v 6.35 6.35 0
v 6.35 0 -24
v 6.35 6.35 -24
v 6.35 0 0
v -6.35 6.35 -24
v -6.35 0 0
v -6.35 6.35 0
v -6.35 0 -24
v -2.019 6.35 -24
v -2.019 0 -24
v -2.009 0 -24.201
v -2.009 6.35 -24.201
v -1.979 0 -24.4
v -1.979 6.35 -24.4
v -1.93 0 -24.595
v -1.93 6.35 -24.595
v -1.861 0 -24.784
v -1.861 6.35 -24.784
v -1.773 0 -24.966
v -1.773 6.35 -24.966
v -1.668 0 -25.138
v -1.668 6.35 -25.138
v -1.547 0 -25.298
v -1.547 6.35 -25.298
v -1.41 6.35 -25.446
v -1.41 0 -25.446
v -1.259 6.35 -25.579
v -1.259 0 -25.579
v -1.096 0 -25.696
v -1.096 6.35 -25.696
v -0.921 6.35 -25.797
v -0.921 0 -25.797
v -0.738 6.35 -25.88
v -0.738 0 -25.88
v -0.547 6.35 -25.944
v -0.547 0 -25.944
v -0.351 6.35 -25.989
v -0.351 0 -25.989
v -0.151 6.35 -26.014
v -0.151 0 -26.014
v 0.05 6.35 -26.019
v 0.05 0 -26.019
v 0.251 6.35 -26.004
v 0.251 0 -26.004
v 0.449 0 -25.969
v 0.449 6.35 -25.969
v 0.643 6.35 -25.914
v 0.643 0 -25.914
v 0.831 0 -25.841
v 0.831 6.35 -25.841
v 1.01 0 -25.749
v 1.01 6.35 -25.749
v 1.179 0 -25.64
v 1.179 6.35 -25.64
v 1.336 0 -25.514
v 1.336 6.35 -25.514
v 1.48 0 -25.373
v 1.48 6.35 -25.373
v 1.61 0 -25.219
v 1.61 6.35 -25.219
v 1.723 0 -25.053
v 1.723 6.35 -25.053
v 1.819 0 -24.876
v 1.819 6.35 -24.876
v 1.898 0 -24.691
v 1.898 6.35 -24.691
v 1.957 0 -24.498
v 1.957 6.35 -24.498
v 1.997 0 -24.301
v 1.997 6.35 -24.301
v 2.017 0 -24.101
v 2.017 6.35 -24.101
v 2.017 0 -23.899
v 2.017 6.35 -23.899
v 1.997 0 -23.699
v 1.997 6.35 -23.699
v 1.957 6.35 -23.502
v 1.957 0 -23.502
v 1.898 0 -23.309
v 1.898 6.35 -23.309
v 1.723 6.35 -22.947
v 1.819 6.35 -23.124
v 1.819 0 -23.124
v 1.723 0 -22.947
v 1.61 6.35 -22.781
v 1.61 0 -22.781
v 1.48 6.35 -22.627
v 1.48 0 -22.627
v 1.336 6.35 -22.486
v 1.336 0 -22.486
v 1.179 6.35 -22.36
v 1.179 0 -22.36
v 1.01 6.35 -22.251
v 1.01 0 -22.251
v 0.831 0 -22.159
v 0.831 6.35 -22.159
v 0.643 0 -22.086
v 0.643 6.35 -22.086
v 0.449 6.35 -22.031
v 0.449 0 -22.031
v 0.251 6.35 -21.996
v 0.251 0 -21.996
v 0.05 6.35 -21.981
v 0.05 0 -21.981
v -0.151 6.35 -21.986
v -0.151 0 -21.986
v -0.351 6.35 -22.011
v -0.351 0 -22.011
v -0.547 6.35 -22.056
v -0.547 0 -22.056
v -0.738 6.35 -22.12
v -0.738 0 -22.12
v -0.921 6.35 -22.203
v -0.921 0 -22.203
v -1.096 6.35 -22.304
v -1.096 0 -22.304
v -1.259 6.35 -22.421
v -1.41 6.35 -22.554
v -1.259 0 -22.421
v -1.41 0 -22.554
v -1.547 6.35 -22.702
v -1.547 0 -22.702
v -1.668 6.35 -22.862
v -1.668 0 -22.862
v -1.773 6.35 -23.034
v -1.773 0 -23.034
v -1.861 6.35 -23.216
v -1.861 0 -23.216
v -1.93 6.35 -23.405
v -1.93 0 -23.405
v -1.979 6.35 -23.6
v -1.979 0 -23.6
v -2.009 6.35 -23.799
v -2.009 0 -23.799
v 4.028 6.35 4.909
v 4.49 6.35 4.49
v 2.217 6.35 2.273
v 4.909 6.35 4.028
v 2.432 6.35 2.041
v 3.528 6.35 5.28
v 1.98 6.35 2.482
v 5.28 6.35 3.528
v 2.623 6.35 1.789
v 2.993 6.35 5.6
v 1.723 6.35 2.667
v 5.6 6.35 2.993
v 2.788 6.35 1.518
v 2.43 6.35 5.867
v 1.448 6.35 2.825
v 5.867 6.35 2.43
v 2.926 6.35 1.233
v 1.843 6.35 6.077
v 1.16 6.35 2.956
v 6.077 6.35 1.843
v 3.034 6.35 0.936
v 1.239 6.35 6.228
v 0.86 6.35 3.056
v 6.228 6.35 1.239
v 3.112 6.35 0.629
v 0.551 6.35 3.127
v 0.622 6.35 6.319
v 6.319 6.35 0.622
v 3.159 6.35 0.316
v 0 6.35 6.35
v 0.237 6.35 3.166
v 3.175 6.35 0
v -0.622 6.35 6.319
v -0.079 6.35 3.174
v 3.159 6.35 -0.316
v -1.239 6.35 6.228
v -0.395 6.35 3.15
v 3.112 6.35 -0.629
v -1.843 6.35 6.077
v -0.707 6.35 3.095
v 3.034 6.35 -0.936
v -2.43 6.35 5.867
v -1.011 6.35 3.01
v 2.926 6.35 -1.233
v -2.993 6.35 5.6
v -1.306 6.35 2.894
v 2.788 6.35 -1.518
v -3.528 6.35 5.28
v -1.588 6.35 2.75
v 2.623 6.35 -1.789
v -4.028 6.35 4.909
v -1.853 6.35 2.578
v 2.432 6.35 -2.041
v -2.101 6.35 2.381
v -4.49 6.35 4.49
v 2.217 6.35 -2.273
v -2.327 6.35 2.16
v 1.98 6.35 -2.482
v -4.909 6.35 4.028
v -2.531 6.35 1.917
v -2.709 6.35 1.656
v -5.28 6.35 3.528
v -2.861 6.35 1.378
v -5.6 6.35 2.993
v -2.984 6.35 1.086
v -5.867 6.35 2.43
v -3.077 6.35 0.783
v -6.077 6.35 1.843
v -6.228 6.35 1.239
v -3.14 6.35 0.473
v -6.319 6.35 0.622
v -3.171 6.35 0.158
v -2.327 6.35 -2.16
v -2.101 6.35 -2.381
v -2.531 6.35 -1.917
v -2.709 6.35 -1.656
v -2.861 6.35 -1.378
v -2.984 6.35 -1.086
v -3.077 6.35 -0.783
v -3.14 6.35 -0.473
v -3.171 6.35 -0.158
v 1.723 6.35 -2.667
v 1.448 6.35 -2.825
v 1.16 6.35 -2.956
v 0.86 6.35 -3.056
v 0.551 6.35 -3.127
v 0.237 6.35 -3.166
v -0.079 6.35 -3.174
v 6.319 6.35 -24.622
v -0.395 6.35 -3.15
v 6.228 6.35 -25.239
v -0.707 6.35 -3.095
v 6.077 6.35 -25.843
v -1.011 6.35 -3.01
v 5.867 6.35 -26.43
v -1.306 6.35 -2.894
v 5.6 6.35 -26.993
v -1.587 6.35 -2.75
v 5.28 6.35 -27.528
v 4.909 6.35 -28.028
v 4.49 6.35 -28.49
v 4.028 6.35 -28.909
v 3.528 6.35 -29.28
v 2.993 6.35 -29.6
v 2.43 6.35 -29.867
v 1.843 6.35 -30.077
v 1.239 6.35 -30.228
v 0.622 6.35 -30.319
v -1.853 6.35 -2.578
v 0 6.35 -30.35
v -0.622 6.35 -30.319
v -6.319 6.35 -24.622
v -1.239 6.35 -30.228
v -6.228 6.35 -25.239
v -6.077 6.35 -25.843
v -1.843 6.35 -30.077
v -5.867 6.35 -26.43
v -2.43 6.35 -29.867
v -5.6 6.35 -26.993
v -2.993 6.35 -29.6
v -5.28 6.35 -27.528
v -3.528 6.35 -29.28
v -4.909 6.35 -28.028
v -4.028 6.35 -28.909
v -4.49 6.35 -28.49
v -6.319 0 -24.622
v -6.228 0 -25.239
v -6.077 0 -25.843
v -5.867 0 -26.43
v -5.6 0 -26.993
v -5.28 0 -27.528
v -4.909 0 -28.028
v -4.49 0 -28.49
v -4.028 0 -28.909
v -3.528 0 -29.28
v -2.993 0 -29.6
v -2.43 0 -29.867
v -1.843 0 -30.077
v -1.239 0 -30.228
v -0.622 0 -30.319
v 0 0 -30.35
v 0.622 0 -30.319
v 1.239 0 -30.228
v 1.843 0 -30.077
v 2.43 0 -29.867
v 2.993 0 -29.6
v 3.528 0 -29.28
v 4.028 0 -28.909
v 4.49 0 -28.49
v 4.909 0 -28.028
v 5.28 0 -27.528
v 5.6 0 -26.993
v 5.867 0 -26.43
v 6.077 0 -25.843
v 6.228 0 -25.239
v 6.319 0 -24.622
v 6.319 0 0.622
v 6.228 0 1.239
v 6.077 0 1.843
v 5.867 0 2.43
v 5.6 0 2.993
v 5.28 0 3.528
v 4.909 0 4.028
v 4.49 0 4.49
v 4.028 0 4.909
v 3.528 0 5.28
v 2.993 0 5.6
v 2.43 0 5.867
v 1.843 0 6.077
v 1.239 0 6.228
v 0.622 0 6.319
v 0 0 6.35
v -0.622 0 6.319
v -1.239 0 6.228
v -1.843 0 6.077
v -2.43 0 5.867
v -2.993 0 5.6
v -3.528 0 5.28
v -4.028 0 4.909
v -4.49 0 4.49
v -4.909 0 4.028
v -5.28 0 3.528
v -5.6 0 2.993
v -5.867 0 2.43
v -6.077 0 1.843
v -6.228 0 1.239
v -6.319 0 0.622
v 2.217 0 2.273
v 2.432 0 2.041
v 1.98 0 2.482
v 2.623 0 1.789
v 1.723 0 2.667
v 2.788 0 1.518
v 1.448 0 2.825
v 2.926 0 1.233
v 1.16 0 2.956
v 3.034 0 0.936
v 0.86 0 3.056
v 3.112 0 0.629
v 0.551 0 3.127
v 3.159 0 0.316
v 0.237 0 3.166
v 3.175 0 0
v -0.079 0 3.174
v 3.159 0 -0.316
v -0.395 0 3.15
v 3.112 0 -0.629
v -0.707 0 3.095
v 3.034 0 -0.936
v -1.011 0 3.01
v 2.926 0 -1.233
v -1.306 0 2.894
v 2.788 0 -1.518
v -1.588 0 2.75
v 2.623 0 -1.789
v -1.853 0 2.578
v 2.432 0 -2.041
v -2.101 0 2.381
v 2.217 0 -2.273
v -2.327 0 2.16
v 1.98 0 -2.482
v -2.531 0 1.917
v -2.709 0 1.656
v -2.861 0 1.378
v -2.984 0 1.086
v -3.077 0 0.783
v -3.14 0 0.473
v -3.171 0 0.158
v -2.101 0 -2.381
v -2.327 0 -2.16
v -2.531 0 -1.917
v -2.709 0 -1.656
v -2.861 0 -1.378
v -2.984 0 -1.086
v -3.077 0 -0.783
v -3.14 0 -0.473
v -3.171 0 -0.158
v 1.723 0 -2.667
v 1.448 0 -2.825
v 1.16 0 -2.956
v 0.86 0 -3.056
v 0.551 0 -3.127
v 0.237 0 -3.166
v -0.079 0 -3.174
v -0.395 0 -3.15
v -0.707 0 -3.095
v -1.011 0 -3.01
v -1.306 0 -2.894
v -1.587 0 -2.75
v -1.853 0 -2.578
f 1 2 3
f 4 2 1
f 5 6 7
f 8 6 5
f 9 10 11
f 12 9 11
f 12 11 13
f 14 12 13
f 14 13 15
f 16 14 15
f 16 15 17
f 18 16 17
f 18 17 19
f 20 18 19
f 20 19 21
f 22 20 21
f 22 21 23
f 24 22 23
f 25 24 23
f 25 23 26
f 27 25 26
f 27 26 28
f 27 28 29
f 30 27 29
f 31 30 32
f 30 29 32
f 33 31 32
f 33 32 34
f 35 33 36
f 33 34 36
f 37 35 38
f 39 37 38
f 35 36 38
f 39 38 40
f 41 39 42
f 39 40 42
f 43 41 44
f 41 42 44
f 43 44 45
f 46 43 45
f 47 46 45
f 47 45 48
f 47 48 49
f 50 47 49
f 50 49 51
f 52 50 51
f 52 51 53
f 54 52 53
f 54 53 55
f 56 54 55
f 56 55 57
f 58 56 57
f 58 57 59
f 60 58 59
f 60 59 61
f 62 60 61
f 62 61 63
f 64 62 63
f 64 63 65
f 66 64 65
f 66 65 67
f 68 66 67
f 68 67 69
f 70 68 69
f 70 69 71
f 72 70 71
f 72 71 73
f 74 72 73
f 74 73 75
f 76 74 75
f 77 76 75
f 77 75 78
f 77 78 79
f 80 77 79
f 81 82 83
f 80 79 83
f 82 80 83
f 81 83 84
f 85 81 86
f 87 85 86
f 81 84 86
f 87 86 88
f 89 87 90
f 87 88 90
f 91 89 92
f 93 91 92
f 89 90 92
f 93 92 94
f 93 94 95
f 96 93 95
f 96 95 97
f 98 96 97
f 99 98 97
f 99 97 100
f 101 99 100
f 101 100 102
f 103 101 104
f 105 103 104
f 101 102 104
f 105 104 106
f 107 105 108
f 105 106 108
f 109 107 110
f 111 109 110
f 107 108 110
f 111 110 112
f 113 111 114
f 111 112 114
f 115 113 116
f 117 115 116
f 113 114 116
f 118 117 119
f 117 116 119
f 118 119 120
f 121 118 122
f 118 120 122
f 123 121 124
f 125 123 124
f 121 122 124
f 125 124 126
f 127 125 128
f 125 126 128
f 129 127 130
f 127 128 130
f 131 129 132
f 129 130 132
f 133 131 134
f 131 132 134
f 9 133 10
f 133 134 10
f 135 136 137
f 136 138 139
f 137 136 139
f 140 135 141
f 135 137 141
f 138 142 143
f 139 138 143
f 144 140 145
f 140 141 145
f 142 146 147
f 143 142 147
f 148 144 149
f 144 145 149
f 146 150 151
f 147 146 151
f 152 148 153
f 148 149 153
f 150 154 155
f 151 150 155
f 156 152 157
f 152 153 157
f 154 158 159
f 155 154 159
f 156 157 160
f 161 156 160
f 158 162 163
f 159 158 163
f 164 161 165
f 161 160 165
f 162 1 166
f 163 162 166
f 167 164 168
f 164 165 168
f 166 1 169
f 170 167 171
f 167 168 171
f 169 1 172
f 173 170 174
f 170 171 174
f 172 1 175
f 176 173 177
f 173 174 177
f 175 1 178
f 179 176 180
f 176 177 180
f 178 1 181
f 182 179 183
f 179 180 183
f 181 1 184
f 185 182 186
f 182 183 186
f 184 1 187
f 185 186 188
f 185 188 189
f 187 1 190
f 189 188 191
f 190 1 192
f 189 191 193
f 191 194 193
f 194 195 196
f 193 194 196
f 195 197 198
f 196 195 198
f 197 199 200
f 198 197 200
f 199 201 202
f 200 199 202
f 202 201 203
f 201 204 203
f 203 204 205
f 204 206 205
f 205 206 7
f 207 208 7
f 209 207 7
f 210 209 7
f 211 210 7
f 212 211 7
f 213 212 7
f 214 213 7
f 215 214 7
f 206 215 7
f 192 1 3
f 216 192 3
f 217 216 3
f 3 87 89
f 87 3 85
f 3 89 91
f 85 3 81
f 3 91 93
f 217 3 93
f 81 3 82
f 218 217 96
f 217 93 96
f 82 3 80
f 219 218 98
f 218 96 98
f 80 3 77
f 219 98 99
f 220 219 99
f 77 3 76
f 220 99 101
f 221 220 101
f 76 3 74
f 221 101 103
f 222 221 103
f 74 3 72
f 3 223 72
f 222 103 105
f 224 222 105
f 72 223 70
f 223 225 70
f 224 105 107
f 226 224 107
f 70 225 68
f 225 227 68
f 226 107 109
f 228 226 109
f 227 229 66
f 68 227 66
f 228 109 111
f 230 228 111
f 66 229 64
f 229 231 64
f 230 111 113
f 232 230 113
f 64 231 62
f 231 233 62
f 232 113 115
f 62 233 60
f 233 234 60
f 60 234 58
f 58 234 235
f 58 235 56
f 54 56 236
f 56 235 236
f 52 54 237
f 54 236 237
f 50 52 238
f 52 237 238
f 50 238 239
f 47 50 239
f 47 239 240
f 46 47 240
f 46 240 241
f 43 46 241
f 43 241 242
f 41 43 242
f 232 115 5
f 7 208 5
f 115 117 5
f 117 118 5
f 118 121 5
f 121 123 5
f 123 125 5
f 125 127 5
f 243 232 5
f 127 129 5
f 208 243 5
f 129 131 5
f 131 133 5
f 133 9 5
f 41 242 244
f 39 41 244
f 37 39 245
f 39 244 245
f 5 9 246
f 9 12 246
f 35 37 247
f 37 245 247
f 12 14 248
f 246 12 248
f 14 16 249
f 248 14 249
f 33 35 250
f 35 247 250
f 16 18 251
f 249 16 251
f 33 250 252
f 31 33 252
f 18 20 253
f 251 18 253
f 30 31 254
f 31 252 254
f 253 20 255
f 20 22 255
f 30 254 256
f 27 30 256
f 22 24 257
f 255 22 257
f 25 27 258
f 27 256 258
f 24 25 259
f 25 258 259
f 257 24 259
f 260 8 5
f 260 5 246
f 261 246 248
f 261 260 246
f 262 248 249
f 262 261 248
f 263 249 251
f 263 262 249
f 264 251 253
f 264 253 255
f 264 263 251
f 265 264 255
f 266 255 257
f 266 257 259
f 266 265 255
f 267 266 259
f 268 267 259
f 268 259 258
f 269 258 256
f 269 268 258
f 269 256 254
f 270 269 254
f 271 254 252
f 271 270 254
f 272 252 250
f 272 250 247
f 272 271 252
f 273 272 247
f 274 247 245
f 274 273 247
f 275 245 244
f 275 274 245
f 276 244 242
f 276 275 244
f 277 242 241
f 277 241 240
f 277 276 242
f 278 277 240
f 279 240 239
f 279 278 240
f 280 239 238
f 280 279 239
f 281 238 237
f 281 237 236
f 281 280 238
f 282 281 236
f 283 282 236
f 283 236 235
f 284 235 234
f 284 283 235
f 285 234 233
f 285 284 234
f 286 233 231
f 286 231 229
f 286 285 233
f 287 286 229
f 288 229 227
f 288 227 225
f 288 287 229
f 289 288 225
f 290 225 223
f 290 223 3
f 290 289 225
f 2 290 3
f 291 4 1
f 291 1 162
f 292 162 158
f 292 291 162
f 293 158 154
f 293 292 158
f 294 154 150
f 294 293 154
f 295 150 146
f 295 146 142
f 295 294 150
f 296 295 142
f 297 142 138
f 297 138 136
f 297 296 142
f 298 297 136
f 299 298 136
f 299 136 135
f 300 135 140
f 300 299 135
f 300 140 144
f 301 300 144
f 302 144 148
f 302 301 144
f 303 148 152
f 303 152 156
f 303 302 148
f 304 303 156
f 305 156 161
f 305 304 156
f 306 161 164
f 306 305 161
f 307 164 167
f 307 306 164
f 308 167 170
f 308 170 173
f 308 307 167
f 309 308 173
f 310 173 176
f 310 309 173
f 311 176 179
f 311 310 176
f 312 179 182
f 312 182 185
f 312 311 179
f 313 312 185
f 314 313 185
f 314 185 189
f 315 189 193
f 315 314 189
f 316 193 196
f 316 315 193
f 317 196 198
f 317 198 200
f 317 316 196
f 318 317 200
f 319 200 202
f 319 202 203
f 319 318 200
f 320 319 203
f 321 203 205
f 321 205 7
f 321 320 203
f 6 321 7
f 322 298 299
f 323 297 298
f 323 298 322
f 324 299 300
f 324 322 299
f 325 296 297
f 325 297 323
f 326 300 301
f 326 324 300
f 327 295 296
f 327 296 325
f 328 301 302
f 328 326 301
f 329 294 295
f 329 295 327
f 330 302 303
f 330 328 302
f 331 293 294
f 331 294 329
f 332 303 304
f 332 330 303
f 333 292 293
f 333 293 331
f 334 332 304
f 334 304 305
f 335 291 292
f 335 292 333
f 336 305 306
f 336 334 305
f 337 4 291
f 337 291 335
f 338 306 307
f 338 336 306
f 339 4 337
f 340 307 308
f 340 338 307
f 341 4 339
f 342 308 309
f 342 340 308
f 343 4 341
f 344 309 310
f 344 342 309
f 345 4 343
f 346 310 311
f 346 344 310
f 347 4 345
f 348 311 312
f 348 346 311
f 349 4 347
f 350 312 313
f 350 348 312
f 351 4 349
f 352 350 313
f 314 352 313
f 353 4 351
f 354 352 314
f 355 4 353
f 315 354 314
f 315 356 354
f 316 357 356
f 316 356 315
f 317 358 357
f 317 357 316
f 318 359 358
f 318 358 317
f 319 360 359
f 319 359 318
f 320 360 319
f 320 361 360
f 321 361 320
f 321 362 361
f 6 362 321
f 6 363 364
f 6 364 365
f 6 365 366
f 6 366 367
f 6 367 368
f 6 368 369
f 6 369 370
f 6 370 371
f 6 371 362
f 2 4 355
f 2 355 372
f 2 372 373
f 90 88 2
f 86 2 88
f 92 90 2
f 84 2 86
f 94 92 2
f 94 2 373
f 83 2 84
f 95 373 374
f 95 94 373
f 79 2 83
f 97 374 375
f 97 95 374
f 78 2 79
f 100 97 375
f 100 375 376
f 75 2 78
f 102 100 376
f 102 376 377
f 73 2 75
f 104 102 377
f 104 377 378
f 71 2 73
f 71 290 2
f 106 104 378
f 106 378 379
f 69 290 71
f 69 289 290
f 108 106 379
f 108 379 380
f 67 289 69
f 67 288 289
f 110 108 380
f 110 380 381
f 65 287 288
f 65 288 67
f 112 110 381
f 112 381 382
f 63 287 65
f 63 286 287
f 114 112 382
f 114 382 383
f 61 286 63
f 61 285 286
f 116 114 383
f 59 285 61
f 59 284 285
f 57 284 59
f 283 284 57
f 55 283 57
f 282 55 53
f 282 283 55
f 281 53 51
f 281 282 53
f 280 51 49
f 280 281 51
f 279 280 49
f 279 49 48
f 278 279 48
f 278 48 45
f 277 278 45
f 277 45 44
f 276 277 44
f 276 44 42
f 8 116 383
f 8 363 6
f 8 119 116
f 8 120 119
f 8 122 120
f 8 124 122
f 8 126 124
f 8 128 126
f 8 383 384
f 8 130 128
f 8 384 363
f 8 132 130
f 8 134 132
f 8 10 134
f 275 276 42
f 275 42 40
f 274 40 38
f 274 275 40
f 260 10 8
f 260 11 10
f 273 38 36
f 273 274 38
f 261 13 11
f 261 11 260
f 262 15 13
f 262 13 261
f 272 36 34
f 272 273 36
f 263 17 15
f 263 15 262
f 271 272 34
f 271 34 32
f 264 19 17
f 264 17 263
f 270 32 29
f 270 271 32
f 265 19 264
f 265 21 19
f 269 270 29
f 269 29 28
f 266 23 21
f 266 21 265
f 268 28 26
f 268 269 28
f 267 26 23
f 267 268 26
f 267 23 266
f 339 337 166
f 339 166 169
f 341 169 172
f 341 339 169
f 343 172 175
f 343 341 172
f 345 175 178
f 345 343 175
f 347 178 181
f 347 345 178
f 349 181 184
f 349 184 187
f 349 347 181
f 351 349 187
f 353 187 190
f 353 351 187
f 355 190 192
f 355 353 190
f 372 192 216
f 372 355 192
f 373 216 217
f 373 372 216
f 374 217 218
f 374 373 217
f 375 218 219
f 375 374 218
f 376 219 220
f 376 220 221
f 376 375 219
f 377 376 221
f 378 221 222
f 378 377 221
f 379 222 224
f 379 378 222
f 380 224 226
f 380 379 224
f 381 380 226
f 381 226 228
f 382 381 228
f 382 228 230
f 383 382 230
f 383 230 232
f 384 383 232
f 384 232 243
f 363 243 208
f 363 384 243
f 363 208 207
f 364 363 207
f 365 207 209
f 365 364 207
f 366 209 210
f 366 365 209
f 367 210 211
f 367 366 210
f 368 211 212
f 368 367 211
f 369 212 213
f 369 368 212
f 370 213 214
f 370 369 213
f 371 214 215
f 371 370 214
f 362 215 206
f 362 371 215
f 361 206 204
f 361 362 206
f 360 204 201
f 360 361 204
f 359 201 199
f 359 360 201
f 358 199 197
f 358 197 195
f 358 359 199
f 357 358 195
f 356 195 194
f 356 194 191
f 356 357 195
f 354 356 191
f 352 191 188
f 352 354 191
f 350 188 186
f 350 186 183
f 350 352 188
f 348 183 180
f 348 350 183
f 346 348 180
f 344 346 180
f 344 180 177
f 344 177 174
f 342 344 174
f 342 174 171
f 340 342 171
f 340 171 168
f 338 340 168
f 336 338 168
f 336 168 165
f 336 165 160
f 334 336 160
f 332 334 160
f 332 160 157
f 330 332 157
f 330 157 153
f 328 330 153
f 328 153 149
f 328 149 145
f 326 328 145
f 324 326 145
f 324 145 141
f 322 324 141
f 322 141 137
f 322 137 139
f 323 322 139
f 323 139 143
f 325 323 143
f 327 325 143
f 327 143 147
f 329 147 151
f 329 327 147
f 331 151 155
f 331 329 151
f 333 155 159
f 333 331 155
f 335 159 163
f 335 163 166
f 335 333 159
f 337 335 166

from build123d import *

# Parameters (mm, degrees)
SKETCH1_R              = 3.175
BOSS_EXTRUDE1_DEPTH    = 6.35
F_10_32_TAPPED_HOLE1_D = 4.0386


with BuildPart() as part:
    # Sketch1 → Boss-Extrude1 (new body)
    with BuildSketch(Plane(origin=(0, 0, 0), x_dir=(1, 0, 0), z_dir=(0, 1, 0))):
        with BuildLine():
            Line((6.35, 24), (6.35, 0))
            ThreePointArc((6.35, 0), (0, -6.35), (-6.35, 0))
            Line((-6.35, 0), (-6.35, 24))
            ThreePointArc((-6.35, 24), (0, 30.35), (6.35, 24))
        make_face()
        Circle(SKETCH1_R, mode=Mode.SUBTRACT)
    extrude(amount=BOSS_EXTRUDE1_DEPTH)

    # #10-32 Tapped Hole1 (through all)
    with Locations(Plane(origin=(0, 6.35, 0), x_dir=(1, 0, 0), z_dir=(0, 1, 0))):
        with Locations((0, 24)):
            Hole(F_10_32_TAPPED_HOLE1_D / 2)


solid = part.part
